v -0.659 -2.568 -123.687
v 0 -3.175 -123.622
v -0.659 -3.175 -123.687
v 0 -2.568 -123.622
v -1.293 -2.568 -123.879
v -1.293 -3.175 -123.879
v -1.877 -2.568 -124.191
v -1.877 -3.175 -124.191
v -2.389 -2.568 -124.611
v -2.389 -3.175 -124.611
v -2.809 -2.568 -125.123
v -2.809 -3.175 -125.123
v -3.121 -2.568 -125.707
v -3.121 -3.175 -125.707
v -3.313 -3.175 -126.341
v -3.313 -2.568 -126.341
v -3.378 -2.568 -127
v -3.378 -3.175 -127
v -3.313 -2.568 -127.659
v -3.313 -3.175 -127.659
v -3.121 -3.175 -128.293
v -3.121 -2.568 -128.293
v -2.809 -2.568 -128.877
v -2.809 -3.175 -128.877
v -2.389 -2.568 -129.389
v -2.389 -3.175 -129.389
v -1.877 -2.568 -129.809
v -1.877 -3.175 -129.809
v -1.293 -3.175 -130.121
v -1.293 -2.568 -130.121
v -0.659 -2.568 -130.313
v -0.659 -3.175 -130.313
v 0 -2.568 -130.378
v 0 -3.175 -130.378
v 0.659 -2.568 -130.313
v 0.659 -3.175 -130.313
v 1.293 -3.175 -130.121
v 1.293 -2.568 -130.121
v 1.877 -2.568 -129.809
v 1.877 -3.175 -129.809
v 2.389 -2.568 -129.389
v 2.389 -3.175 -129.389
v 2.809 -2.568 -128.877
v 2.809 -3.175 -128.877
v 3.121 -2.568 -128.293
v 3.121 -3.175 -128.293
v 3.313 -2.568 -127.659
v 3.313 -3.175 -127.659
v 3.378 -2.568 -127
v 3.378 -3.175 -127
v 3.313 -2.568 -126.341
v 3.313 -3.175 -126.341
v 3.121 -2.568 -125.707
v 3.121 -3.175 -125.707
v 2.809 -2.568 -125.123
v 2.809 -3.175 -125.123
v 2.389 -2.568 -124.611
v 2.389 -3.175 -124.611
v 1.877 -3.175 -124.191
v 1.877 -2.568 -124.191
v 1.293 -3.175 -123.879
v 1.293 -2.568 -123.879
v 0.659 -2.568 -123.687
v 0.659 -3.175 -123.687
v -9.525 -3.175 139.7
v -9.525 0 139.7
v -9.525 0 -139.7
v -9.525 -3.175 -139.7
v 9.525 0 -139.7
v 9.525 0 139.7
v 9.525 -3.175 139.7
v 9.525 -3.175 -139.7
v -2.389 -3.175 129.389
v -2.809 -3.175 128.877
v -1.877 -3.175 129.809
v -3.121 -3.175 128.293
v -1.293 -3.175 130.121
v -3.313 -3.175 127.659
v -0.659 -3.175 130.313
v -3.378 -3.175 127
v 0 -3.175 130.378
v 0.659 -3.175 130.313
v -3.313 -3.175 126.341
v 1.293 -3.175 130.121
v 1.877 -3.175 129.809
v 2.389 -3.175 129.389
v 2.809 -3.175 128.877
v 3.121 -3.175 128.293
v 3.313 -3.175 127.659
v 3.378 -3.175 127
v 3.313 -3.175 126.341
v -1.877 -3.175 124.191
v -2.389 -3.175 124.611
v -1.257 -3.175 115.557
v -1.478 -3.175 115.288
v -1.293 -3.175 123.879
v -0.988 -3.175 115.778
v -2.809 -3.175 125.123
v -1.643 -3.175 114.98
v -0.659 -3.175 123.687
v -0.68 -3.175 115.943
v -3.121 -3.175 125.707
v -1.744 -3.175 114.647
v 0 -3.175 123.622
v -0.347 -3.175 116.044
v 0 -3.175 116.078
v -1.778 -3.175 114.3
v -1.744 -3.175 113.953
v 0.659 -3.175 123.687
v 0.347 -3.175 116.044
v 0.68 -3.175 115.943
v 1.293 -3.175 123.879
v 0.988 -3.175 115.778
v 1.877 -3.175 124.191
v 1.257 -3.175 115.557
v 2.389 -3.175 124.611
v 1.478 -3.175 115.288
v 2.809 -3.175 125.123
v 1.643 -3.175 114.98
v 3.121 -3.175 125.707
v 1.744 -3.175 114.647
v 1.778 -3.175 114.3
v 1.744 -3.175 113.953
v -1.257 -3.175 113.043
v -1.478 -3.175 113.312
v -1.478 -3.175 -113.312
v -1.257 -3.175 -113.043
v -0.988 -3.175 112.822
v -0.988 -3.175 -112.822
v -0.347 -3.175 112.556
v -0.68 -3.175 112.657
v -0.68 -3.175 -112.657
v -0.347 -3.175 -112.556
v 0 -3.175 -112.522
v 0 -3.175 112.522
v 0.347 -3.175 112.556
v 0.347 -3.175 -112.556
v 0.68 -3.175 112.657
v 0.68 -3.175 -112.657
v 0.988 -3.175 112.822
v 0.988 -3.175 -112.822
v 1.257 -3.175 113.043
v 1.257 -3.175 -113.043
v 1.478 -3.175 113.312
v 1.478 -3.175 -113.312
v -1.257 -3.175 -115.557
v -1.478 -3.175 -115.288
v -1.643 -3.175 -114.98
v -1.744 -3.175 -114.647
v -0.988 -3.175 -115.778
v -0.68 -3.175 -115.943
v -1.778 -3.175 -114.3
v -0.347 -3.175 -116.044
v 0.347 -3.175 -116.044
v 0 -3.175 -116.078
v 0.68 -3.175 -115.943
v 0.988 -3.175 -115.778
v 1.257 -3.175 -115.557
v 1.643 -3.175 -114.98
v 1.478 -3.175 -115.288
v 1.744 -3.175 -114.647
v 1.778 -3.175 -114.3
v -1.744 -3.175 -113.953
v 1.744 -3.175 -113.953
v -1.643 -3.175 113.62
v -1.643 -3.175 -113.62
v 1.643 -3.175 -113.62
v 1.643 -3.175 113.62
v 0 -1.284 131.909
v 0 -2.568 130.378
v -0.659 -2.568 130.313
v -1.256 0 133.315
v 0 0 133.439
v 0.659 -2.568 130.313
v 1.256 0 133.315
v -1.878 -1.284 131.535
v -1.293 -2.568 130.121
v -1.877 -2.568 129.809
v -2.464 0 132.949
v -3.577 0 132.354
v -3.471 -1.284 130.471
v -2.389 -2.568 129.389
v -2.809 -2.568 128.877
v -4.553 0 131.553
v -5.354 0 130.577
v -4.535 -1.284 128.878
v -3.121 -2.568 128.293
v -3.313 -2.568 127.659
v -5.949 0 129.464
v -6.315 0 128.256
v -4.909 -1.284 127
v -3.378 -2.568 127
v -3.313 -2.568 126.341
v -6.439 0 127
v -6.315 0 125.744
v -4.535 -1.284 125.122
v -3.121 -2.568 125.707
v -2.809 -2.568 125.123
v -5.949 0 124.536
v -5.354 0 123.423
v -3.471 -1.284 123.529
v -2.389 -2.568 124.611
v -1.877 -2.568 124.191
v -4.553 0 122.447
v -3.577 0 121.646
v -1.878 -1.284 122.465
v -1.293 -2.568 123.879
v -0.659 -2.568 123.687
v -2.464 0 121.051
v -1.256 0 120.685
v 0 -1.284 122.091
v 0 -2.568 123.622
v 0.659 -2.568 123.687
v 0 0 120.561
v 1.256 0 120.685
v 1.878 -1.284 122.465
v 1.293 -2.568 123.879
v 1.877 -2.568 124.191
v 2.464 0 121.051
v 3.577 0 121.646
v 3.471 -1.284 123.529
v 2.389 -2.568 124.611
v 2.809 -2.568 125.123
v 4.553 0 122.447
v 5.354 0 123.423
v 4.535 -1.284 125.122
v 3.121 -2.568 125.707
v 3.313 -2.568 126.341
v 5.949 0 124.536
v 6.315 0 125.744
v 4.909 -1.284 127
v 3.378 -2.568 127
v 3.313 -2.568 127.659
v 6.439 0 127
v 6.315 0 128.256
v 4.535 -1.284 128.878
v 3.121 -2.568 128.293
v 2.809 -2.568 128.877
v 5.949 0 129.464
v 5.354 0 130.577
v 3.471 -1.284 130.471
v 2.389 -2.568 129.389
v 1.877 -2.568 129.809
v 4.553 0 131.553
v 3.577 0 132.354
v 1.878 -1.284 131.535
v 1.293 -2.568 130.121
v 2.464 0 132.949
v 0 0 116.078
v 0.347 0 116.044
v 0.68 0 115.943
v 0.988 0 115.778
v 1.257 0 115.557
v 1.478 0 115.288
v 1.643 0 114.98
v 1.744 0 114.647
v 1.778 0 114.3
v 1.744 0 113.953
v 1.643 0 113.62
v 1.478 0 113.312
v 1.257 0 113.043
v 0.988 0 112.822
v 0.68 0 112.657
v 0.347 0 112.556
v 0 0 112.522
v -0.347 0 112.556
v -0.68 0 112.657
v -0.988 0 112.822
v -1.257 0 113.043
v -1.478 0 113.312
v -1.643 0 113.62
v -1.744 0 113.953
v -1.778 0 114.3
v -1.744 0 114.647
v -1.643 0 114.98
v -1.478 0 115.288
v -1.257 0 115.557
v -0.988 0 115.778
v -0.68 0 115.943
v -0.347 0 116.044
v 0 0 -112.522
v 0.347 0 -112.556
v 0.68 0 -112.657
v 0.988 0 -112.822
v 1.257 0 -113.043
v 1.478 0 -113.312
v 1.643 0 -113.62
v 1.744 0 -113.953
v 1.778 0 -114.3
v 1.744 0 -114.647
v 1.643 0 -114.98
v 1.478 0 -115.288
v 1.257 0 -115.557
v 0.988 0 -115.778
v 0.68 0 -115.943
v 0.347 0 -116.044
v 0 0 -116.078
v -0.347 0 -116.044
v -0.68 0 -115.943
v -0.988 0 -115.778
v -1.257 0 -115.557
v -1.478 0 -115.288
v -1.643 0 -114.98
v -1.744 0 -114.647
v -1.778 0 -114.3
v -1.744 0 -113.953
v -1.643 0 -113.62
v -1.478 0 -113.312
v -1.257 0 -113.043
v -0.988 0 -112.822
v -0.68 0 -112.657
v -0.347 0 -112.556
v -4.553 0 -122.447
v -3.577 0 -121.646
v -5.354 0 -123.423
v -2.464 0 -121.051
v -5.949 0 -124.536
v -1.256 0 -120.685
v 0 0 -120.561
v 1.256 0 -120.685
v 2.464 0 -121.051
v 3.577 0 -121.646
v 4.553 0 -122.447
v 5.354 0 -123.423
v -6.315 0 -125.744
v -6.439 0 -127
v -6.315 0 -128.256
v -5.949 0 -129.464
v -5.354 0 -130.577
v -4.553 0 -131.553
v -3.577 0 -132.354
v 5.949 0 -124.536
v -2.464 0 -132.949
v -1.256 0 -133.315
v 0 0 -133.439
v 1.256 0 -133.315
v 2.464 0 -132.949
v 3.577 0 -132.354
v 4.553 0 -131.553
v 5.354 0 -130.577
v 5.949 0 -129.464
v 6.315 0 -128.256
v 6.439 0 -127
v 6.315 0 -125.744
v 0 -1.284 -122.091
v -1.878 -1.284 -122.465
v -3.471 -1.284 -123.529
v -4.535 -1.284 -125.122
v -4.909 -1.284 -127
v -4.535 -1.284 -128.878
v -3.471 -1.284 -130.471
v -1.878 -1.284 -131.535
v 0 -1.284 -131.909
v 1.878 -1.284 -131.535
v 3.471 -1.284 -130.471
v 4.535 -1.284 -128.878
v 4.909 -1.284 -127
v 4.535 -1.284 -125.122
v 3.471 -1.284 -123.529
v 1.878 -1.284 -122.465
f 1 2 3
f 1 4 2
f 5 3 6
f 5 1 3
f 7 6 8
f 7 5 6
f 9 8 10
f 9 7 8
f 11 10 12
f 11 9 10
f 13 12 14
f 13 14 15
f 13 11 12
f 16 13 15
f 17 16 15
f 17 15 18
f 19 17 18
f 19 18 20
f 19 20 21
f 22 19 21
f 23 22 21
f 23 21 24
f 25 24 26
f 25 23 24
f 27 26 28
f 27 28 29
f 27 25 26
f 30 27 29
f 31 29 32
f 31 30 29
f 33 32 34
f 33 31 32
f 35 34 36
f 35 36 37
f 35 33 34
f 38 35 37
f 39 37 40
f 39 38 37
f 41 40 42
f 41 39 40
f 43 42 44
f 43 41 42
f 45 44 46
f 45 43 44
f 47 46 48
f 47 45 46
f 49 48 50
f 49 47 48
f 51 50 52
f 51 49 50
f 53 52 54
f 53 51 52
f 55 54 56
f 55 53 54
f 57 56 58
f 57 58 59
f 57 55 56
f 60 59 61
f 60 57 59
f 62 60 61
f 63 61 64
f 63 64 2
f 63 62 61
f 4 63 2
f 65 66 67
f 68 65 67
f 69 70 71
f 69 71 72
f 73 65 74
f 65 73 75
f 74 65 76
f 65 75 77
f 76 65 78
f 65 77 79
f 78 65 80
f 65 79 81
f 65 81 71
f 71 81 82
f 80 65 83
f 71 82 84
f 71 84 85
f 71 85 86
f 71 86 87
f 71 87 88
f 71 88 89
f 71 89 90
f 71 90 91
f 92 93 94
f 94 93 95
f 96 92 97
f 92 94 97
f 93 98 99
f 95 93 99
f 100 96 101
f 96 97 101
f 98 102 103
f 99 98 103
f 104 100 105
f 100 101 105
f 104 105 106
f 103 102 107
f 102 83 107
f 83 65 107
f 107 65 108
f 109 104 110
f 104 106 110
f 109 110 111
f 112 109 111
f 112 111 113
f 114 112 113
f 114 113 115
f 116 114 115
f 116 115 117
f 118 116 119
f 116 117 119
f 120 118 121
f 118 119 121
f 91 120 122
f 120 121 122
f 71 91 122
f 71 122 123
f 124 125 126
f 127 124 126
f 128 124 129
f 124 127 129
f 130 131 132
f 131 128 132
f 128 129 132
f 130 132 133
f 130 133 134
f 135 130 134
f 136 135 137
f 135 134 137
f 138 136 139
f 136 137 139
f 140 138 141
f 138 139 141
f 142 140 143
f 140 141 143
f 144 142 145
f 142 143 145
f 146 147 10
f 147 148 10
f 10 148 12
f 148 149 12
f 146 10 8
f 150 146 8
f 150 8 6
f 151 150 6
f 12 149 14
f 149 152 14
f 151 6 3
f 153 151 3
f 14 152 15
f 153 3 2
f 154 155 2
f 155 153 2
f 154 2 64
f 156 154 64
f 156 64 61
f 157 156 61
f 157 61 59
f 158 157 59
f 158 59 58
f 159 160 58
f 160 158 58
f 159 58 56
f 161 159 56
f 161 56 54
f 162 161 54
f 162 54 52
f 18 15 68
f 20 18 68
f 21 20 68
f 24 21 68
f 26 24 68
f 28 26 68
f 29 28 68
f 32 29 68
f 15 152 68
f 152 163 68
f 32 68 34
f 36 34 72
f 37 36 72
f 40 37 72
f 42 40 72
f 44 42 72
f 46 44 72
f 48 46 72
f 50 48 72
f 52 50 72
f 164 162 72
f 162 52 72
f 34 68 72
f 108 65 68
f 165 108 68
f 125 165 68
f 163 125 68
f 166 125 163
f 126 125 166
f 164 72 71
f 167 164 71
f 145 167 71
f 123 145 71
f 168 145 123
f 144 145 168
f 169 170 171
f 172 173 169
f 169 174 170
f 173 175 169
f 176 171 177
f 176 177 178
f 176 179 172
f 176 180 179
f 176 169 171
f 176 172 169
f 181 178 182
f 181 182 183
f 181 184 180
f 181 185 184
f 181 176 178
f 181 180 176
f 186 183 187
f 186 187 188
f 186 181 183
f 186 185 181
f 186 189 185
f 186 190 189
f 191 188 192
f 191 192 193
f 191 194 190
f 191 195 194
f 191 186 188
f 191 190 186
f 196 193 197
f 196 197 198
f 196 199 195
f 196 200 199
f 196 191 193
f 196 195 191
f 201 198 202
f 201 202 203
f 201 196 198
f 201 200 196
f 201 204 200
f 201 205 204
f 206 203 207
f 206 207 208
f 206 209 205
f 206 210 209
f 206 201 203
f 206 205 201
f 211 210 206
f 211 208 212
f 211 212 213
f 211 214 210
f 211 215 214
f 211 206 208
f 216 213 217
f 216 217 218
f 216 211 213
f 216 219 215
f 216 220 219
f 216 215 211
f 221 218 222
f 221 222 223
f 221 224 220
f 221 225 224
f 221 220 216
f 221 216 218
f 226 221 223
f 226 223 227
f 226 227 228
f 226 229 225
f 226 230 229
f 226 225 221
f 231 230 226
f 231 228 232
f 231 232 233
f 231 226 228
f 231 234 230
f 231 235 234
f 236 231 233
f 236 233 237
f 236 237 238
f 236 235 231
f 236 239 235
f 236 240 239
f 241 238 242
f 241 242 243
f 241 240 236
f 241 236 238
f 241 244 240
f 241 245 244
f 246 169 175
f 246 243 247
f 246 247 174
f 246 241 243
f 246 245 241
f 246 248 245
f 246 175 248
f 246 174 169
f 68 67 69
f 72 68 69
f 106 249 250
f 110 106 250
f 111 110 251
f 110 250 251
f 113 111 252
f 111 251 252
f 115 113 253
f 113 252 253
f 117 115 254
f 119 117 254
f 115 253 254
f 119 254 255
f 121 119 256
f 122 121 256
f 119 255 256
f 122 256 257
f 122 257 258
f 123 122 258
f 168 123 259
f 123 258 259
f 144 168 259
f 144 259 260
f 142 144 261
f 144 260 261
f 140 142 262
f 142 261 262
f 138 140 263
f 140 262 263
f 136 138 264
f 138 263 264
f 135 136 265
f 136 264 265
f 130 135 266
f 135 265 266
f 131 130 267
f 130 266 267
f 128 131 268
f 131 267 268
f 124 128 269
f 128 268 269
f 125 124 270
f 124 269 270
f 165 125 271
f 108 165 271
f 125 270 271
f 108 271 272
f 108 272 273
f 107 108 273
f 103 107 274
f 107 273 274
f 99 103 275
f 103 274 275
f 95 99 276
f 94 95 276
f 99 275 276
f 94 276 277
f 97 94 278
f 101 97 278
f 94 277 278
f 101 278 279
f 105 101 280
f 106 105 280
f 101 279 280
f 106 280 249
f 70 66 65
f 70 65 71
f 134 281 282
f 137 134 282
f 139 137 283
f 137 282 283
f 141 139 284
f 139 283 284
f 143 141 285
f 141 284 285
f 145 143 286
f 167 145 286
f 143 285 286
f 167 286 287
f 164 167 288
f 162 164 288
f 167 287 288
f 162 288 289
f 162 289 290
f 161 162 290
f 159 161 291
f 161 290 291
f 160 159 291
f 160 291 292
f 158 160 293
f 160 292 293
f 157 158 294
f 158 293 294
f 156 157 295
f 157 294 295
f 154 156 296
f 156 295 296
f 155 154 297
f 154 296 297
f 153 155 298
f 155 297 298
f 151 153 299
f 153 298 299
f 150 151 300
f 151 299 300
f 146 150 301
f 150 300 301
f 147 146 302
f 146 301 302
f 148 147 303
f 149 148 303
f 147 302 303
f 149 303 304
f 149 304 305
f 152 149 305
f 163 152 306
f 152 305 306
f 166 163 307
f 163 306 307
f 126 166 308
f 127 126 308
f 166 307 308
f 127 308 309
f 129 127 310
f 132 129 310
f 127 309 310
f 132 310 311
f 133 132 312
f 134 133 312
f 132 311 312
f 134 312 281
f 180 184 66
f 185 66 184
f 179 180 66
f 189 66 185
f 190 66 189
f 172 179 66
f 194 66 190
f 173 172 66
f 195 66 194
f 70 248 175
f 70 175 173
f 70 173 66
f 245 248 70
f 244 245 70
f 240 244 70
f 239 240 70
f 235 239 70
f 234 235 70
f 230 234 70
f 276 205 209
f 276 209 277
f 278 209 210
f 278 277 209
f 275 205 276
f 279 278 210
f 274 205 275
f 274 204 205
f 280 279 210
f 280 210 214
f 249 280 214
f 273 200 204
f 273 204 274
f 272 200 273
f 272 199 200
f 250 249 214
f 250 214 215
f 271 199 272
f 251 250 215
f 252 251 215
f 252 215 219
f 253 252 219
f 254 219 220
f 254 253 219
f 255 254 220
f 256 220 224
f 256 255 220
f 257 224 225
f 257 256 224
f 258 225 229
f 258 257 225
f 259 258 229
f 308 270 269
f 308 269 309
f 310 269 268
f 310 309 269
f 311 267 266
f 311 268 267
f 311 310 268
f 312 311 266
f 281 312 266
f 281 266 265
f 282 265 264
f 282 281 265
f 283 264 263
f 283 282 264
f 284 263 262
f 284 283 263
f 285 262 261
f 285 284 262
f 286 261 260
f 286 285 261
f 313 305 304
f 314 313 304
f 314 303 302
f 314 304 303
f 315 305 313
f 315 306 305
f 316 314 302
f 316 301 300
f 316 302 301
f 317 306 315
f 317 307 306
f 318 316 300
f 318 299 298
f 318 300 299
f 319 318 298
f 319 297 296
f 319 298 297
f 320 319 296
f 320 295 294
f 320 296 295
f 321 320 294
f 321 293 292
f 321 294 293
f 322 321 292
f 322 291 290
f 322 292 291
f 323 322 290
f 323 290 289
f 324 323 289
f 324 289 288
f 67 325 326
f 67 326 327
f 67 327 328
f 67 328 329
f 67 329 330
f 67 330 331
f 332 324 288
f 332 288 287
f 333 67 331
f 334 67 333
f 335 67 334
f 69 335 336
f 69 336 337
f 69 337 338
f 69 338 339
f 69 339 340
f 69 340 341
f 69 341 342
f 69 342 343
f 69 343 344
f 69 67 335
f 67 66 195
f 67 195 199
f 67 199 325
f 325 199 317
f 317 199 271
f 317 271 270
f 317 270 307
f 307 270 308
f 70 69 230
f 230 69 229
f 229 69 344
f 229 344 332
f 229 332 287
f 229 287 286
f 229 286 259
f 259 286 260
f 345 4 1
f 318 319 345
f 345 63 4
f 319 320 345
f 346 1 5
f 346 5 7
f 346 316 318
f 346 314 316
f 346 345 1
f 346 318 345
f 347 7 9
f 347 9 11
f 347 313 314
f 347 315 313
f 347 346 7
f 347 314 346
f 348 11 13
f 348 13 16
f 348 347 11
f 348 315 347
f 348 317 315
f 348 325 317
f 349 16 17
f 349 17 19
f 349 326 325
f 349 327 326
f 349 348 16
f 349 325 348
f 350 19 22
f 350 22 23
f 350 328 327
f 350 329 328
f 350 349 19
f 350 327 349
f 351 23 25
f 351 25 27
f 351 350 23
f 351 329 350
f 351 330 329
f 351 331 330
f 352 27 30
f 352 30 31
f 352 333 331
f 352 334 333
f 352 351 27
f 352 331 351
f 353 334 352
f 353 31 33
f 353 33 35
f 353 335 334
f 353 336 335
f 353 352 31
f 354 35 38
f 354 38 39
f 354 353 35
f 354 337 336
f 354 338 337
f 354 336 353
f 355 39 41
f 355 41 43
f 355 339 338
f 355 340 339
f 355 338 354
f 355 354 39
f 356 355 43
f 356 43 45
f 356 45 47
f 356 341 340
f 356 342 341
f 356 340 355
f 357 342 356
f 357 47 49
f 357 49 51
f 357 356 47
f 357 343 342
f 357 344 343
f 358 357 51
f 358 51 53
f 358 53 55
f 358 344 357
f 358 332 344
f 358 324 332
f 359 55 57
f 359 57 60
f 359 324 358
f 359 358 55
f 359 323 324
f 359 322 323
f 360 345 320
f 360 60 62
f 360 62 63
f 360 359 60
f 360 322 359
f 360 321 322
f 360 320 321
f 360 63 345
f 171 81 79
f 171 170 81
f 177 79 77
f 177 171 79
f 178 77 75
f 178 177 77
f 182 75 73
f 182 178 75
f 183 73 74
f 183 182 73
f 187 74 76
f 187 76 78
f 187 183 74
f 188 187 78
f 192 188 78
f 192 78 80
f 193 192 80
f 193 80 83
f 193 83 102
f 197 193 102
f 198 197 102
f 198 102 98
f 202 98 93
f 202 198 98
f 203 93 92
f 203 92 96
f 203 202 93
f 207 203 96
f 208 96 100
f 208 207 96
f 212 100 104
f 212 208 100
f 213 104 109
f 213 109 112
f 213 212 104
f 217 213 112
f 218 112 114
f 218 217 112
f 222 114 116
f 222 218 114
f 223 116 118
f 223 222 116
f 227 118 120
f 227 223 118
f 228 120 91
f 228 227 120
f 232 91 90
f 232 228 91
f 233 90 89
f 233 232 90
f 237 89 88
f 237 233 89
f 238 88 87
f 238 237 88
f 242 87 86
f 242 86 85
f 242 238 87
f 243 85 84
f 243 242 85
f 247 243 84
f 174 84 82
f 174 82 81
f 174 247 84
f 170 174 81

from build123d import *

# Parameters (mm, degrees)
SKETCH1_W                                   = 19.05
SKETCH1_H                                   = 279.4
SKETCH1_R                                   = 1.778
BOSS_EXTRUDE1_DEPTH                         = 3.175
CSK_FOR_1_4_FLAT_HEAD_MACHINE_SCREW_2_COUNT = 2
CSK_FOR_1_4_FLAT_HEAD_MACHINE_SCREW_2_PITCH = 254


with BuildPart() as part:
    # Sketch1 → Boss-Extrude1 (new body)
    with BuildSketch(Plane(origin=(0, 0, 0), x_dir=(1, 0, 0), z_dir=(0, 1, 0))):
        Rectangle(SKETCH1_W, SKETCH1_H)
        with Locations(Location((0, 114.3, 0), (0, 0, 270))):
            Circle(SKETCH1_R, mode=Mode.SUBTRACT)
        with Locations(Location((0, -114.3, 0), (0, 0, 270))):
            Circle(SKETCH1_R, mode=Mode.SUBTRACT)
    extrude(amount=-BOSS_EXTRUDE1_DEPTH)

    # Sketch3 → CSK for 1/4 Flat Head Machine Screw (100)1 (revolve, cut)
    with BuildSketch(Plane(origin=(0, 0, 127), x_dir=(0, 0, 1), z_dir=(1, 0, 0))):
        Polygon((0, 0), (0, 3.175), (3.3782, 3.175), (3.3782, 2.568232241), (6.4389, 0), align=None)
    csk_for_1_4_flat_head_machine_screw_100 = revolve(axis=Axis((0, 6.35, 127), (0, -1, 0)), mode=Mode.SUBTRACT)

    # CSK for 1_4 Flat Head Machine Screw  2: CSK for 1/4 Flat Head Machine Screw (100)1 ×2
    with Locations(*[(0, 0, -i * CSK_FOR_1_4_FLAT_HEAD_MACHINE_SCREW_2_PITCH) for i in range(1, CSK_FOR_1_4_FLAT_HEAD_MACHINE_SCREW_2_COUNT)]):
        add(csk_for_1_4_flat_head_machine_screw_100, mode=Mode.SUBTRACT)


solid = part.part
